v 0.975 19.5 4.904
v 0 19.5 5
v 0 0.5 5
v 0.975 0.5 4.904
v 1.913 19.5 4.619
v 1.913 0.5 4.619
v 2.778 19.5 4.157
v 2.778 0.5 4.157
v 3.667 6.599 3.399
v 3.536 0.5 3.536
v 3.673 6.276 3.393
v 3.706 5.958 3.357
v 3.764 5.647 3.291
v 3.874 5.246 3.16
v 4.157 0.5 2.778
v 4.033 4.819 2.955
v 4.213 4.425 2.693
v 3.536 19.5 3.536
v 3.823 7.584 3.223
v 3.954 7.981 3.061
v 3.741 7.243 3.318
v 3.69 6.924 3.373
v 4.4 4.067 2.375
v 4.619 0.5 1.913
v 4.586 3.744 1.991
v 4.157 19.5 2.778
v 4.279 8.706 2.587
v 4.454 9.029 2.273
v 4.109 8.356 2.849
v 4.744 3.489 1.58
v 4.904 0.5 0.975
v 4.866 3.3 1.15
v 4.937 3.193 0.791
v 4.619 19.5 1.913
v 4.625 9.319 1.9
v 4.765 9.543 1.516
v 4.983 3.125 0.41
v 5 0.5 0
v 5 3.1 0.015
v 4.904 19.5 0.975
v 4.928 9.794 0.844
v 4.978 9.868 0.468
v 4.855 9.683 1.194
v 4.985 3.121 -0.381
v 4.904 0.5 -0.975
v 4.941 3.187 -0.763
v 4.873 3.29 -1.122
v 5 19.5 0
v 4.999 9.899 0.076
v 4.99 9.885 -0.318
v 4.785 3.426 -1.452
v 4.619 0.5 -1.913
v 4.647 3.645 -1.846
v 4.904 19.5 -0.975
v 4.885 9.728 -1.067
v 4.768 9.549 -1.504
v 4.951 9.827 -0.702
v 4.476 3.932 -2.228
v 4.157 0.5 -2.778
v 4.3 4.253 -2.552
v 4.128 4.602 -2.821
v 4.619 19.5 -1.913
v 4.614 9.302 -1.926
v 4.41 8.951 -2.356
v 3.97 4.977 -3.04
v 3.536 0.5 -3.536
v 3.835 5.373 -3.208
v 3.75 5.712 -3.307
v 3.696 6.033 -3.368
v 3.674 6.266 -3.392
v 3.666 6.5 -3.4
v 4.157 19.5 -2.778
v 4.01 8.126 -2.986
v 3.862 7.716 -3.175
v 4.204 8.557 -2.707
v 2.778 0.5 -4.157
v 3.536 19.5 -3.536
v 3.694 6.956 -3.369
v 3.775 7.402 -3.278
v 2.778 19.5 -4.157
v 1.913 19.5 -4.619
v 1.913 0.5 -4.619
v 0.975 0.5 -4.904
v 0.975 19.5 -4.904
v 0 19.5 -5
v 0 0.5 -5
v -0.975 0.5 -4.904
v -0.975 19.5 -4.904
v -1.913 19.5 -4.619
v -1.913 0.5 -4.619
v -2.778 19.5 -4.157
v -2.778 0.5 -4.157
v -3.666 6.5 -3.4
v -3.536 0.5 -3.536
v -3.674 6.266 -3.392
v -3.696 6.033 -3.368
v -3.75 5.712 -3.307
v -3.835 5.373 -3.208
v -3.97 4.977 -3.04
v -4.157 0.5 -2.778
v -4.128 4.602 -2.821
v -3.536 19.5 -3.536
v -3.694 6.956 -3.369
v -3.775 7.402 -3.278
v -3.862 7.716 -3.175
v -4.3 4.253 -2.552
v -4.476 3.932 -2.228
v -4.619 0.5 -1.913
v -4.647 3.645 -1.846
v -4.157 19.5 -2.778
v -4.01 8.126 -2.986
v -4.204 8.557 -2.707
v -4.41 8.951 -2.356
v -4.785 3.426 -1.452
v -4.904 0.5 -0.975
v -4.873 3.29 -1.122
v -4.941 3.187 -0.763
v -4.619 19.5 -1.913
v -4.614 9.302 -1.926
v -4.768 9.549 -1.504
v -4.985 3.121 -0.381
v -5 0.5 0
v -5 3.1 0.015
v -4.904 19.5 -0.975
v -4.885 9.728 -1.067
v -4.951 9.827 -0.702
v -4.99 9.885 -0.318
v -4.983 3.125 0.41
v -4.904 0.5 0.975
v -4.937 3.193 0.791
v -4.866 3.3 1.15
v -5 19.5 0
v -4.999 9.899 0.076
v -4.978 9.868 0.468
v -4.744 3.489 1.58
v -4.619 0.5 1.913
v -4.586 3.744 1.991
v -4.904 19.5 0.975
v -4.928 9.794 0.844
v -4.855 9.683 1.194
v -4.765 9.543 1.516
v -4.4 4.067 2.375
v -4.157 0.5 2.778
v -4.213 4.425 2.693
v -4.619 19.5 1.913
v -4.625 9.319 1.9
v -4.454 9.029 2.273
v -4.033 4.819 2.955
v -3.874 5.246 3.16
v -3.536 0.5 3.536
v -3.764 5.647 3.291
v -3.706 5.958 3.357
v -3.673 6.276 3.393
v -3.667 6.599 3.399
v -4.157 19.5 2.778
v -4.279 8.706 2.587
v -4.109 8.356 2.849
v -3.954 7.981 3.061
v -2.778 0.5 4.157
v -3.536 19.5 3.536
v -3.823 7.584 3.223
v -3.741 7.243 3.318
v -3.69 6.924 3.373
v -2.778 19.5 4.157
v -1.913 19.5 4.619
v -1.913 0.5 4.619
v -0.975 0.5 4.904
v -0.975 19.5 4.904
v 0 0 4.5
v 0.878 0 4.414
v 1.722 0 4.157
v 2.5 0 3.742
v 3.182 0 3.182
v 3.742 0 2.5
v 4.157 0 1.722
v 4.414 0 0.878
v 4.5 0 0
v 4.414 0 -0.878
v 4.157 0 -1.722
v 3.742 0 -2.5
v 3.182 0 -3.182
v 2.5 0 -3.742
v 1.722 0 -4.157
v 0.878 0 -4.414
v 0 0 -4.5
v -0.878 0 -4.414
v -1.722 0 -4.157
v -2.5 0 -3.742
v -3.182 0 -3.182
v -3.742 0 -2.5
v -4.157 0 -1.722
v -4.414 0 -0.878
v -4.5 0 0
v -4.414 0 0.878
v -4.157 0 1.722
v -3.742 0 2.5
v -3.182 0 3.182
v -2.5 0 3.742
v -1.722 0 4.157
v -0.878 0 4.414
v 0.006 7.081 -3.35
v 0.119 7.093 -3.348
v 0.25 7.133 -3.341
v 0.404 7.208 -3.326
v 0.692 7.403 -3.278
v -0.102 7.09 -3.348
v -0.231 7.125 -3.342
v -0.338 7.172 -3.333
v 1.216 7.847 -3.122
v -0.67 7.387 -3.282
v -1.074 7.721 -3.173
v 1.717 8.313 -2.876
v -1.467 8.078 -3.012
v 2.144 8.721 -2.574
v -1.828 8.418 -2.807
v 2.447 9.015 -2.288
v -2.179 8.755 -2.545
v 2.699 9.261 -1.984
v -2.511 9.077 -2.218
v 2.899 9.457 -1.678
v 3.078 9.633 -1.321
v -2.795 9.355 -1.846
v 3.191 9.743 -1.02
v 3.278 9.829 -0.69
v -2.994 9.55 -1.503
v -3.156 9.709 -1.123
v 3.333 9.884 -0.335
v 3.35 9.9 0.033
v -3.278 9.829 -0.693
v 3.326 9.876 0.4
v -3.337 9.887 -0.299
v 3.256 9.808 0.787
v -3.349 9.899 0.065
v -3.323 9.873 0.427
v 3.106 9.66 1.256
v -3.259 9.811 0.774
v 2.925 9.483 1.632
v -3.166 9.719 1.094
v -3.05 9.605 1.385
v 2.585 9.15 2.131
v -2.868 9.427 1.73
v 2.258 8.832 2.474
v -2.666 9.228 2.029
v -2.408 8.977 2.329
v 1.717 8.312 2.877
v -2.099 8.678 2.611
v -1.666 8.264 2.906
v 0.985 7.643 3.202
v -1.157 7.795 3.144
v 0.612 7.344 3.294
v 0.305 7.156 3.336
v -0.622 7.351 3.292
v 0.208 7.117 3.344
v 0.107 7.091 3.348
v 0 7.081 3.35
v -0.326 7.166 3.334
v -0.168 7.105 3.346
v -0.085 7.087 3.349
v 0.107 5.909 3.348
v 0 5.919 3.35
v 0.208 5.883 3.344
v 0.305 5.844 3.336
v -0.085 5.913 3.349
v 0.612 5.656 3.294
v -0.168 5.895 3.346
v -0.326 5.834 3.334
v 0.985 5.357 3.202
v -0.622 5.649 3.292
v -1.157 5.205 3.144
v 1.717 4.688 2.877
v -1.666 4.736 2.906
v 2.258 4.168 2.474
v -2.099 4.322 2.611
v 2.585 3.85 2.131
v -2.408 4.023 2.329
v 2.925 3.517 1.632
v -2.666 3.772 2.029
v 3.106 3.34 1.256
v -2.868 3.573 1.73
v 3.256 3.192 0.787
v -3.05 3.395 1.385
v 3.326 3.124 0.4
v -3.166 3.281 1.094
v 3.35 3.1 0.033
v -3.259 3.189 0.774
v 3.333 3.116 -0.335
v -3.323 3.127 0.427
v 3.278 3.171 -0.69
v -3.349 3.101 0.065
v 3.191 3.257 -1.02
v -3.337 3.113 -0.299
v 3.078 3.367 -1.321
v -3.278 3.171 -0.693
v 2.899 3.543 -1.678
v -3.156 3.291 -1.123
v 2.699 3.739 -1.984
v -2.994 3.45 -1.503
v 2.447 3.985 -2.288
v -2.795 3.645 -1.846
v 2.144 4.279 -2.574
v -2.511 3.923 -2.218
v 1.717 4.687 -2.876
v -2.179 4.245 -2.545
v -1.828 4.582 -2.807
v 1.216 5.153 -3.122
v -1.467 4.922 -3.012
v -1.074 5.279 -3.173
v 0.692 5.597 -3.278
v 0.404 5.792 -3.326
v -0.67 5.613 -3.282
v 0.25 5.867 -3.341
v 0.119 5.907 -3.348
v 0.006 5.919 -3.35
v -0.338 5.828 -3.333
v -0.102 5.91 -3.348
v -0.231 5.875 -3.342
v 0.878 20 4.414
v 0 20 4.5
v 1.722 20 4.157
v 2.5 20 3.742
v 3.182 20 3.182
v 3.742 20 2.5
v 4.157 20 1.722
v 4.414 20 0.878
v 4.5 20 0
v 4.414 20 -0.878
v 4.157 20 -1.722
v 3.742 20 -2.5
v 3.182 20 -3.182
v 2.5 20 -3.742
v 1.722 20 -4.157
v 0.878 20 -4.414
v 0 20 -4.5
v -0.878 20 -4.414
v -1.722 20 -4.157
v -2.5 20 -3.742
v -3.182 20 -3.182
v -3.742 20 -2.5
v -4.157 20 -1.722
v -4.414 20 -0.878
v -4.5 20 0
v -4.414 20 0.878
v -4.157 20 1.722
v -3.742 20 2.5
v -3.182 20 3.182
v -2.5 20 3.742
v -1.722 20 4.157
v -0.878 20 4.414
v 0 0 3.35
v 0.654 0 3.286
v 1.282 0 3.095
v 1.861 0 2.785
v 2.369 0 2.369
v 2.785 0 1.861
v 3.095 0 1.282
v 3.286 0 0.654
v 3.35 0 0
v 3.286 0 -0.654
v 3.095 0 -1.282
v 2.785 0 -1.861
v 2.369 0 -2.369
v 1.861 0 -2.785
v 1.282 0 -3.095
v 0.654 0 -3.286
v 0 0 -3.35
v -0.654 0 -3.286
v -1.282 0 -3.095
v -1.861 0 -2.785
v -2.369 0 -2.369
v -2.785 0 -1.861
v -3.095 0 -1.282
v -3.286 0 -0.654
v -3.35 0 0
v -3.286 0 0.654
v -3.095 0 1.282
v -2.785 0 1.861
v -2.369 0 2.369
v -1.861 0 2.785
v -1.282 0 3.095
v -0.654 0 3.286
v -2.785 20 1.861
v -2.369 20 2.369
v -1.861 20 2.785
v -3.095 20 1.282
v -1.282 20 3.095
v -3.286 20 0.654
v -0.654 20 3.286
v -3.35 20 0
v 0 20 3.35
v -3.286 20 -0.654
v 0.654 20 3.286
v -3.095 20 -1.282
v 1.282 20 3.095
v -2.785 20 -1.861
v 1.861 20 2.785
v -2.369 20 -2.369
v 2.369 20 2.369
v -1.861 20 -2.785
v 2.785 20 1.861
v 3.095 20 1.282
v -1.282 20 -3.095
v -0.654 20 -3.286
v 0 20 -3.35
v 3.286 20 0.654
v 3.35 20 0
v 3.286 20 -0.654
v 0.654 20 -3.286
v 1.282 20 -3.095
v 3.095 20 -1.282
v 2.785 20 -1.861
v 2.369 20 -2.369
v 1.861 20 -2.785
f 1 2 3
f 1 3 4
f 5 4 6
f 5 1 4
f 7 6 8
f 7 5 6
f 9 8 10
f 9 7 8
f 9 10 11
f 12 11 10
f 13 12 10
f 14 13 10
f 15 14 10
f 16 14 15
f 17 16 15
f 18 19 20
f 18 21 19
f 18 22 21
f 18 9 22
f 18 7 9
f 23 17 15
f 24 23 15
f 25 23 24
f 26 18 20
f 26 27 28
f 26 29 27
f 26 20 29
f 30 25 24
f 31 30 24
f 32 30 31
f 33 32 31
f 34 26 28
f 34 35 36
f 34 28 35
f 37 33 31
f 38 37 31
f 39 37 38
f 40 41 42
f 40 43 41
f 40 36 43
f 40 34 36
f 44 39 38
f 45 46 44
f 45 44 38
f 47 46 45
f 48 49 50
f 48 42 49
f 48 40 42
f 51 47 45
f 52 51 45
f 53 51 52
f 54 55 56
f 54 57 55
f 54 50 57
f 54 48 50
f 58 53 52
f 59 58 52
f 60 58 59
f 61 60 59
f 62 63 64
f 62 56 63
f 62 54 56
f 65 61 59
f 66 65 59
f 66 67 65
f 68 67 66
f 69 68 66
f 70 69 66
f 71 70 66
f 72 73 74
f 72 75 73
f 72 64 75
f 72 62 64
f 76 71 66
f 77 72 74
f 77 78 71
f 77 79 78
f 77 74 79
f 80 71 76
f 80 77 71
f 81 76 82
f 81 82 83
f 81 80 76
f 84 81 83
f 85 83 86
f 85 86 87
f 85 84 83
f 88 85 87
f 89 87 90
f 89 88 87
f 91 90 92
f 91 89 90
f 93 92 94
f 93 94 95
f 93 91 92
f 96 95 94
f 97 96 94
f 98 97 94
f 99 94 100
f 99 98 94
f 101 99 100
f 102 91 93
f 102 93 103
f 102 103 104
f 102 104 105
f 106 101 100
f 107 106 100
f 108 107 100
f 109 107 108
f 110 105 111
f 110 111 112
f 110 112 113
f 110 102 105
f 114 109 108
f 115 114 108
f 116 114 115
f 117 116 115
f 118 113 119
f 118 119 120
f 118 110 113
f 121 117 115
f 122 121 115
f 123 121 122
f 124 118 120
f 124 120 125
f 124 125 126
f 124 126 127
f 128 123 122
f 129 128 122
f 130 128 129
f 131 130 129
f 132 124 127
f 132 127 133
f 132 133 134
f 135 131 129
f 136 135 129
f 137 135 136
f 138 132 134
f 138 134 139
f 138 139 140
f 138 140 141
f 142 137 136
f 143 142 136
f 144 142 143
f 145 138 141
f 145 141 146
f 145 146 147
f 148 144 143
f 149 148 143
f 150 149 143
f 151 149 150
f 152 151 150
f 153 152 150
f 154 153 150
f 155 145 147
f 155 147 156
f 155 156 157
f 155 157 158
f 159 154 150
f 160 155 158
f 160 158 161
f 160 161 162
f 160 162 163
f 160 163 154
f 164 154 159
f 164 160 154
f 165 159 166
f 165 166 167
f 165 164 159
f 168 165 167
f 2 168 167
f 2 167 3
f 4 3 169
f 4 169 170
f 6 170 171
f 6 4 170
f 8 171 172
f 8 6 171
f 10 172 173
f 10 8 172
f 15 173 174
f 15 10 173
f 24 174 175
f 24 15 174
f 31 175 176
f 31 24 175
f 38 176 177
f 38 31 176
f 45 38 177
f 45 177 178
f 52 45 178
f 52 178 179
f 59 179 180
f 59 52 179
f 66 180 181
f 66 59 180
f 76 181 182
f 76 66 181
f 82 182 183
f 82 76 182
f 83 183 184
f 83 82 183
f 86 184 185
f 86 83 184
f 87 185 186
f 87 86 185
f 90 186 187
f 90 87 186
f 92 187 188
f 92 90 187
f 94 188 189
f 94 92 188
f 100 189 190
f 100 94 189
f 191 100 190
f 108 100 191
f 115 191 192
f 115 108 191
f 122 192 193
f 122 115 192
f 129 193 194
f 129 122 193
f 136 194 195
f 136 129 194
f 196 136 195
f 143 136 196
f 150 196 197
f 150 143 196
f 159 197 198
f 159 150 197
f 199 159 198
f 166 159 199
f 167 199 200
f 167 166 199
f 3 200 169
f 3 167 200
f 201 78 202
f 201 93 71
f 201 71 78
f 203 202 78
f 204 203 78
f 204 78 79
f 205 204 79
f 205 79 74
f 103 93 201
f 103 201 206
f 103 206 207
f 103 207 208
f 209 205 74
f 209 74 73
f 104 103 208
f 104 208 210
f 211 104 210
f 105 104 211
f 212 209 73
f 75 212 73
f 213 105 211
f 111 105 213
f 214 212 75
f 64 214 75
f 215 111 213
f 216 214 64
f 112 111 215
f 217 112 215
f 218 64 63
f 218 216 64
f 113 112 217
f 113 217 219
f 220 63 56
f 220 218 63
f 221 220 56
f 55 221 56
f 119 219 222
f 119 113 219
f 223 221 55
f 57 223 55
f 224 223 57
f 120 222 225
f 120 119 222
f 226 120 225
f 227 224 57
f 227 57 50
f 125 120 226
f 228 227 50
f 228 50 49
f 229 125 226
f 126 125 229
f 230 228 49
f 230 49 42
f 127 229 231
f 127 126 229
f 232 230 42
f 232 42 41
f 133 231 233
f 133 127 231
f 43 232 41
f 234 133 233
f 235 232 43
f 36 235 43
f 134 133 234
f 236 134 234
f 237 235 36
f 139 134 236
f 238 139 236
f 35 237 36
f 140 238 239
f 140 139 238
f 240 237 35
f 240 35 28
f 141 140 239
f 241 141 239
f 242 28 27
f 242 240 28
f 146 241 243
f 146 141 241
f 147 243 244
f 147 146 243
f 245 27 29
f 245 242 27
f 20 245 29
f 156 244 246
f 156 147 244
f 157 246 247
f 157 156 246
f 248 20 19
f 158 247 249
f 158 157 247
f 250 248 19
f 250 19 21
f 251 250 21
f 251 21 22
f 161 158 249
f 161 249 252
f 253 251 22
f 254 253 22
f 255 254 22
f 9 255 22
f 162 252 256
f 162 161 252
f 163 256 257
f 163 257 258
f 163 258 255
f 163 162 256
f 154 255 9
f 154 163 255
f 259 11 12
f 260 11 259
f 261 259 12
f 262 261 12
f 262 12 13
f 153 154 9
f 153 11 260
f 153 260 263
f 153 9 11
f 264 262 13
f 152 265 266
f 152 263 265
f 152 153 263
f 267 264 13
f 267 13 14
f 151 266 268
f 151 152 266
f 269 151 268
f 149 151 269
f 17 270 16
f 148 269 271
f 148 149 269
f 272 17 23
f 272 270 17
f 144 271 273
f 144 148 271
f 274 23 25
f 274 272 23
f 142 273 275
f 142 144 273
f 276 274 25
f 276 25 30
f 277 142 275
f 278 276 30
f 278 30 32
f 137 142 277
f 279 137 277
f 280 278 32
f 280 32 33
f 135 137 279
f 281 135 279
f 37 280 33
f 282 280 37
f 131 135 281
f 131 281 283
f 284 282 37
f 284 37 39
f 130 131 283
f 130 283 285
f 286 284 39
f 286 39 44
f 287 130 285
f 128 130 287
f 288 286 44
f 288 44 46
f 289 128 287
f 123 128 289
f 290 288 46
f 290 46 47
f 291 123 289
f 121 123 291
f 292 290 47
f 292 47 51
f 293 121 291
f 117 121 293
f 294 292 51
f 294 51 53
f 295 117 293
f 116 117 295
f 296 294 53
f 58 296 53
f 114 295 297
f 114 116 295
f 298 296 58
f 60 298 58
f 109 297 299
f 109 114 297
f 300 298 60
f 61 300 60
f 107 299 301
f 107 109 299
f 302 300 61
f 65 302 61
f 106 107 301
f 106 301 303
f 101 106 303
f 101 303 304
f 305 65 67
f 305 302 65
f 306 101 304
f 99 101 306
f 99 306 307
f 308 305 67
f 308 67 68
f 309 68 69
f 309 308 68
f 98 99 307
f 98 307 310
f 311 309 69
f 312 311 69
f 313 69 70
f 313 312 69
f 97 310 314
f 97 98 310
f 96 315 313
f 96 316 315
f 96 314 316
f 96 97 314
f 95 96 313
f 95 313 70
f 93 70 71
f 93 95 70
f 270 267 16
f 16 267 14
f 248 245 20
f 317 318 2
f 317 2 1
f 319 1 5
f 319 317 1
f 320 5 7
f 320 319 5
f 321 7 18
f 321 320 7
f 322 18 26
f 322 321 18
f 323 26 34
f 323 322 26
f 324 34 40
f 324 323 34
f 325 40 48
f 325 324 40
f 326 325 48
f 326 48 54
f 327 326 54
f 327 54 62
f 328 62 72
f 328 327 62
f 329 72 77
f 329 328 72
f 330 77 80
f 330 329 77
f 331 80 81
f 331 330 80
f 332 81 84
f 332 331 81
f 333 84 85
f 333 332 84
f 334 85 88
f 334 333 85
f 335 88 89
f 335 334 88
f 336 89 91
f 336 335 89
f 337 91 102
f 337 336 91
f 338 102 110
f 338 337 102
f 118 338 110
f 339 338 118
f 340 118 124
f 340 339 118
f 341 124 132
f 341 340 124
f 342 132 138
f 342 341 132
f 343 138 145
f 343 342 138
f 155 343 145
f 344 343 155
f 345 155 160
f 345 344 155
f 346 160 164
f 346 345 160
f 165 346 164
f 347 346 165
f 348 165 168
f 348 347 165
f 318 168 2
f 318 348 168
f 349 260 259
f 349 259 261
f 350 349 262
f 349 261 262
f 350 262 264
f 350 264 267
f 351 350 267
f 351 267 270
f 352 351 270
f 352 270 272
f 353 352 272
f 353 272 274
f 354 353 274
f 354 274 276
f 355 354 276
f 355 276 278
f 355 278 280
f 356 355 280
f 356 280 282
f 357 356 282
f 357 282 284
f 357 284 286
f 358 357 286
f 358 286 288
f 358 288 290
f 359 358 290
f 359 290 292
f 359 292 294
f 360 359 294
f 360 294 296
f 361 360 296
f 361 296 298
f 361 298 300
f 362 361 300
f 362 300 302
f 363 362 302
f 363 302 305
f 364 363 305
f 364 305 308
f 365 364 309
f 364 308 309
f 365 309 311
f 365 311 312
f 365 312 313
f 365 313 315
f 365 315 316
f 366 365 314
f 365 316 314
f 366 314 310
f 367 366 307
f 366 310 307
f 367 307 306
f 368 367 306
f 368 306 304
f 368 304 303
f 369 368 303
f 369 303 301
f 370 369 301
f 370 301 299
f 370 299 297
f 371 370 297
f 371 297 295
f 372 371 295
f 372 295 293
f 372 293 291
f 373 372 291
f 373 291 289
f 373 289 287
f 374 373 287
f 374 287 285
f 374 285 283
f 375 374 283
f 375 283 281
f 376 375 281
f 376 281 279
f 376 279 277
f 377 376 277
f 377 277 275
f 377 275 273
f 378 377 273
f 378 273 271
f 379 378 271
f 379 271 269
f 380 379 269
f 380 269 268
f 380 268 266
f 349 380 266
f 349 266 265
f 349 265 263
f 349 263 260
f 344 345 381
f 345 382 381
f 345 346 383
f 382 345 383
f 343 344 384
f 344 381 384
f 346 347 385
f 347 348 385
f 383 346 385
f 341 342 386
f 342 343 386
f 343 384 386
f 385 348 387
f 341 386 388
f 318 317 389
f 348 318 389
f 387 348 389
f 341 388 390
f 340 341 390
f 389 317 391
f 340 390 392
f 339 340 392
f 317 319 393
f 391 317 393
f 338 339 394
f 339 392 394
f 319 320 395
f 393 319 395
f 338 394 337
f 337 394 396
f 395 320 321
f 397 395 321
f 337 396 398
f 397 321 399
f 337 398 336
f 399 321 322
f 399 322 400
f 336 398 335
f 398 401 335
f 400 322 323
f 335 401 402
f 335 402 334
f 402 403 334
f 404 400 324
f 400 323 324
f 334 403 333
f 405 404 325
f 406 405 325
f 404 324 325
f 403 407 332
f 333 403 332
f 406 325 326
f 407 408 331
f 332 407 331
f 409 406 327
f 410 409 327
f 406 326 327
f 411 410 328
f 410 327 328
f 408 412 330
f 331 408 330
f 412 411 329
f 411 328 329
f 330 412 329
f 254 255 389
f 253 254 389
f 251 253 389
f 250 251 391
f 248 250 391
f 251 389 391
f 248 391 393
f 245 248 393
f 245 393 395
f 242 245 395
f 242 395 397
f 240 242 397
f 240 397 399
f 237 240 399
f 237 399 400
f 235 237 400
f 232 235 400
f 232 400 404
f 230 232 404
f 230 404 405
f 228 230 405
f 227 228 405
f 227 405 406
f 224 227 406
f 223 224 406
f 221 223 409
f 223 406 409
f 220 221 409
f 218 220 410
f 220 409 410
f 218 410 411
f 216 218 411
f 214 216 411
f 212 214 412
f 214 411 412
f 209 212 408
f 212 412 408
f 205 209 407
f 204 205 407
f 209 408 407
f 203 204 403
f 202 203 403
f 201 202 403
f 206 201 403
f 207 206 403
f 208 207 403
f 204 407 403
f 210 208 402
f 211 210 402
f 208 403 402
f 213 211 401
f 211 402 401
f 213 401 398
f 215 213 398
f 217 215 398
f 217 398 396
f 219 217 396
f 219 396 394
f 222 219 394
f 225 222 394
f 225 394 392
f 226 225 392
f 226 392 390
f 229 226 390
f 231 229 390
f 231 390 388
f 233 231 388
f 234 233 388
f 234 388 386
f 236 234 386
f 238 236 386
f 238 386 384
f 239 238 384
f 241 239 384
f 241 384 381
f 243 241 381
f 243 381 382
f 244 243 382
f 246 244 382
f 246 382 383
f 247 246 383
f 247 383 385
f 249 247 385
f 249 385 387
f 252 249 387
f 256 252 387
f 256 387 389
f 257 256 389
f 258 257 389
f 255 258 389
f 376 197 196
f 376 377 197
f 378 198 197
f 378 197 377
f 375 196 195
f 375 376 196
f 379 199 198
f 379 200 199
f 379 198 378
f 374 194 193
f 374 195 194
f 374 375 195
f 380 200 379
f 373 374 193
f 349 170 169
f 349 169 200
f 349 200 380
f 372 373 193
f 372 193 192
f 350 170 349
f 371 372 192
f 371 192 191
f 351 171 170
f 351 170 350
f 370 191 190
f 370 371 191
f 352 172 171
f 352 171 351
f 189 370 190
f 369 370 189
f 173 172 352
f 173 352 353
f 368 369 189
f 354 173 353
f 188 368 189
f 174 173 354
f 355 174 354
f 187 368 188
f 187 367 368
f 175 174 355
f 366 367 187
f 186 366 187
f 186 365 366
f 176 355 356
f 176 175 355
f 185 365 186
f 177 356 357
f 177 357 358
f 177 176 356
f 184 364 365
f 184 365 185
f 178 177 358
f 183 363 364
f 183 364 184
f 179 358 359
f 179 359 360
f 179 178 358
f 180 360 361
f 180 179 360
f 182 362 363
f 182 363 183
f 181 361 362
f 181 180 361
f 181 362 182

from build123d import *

# Parameters (mm, degrees)
SKETCH_1_W               = 5
SKETCH_1_H               = 20
SKETCH_3_R               = 3.35
CUT_EXTRUDE_1_DEPTH      = 22.213203436
CUT_EXTRUDE_2_DEPTH      = 22.213203436
CUT_EXTRUDE_2_DEPTH_BACK = 22.213203436
SKETCH_4_R               = 3.4
CHAMFER_1_SIZE           = 0.5


with BuildPart() as part:
    # 草图1 → 旋转1 (revolve)
    with BuildSketch(Plane.XY, mode=Mode.PRIVATE) as revolve_1_sk:
        with Locations((2.5, 10)):
            Rectangle(SKETCH_1_W, SKETCH_1_H)
    revolve(revolve_1_sk.sketch.rotate(Axis((0, 20, 0), (0, 1, 0)), 270), axis=Axis((0, 20, 0), (0, 1, 0)))

    # 草图3 → 切除-拉伸1 (cut, through all)
    with BuildSketch(Plane(origin=(0, 20, 0), x_dir=(1, 0, 0), z_dir=(0, 1, 0))):
        with Locations(Location((0, 0, 0), (0, 0, 270))):
            Circle(SKETCH_3_R)
    extrude(amount=-CUT_EXTRUDE_1_DEPTH, mode=Mode.SUBTRACT)

    # 草图4 → 切除-拉伸2 (cut, two sides: drawn at the far end of the back side and taken through both)
    with BuildSketch(Plane(origin=(0, 0, 0), x_dir=(0, 0, -1), z_dir=(1, 0, 0)).offset(-CUT_EXTRUDE_2_DEPTH_BACK)):
        with Locations((0, 6.5)):
            Circle(SKETCH_4_R)
    extrude(amount=CUT_EXTRUDE_2_DEPTH + CUT_EXTRUDE_2_DEPTH_BACK, mode=Mode.SUBTRACT)

    # 倒角1
    chamfer_1_edges = [part.edges().sort_by_distance(p)[0] for p in [
        (0, 20, -5),
        (0, 0, -5),
    ]]
    chamfer(chamfer_1_edges, length=CHAMFER_1_SIZE)


solid = part.part
